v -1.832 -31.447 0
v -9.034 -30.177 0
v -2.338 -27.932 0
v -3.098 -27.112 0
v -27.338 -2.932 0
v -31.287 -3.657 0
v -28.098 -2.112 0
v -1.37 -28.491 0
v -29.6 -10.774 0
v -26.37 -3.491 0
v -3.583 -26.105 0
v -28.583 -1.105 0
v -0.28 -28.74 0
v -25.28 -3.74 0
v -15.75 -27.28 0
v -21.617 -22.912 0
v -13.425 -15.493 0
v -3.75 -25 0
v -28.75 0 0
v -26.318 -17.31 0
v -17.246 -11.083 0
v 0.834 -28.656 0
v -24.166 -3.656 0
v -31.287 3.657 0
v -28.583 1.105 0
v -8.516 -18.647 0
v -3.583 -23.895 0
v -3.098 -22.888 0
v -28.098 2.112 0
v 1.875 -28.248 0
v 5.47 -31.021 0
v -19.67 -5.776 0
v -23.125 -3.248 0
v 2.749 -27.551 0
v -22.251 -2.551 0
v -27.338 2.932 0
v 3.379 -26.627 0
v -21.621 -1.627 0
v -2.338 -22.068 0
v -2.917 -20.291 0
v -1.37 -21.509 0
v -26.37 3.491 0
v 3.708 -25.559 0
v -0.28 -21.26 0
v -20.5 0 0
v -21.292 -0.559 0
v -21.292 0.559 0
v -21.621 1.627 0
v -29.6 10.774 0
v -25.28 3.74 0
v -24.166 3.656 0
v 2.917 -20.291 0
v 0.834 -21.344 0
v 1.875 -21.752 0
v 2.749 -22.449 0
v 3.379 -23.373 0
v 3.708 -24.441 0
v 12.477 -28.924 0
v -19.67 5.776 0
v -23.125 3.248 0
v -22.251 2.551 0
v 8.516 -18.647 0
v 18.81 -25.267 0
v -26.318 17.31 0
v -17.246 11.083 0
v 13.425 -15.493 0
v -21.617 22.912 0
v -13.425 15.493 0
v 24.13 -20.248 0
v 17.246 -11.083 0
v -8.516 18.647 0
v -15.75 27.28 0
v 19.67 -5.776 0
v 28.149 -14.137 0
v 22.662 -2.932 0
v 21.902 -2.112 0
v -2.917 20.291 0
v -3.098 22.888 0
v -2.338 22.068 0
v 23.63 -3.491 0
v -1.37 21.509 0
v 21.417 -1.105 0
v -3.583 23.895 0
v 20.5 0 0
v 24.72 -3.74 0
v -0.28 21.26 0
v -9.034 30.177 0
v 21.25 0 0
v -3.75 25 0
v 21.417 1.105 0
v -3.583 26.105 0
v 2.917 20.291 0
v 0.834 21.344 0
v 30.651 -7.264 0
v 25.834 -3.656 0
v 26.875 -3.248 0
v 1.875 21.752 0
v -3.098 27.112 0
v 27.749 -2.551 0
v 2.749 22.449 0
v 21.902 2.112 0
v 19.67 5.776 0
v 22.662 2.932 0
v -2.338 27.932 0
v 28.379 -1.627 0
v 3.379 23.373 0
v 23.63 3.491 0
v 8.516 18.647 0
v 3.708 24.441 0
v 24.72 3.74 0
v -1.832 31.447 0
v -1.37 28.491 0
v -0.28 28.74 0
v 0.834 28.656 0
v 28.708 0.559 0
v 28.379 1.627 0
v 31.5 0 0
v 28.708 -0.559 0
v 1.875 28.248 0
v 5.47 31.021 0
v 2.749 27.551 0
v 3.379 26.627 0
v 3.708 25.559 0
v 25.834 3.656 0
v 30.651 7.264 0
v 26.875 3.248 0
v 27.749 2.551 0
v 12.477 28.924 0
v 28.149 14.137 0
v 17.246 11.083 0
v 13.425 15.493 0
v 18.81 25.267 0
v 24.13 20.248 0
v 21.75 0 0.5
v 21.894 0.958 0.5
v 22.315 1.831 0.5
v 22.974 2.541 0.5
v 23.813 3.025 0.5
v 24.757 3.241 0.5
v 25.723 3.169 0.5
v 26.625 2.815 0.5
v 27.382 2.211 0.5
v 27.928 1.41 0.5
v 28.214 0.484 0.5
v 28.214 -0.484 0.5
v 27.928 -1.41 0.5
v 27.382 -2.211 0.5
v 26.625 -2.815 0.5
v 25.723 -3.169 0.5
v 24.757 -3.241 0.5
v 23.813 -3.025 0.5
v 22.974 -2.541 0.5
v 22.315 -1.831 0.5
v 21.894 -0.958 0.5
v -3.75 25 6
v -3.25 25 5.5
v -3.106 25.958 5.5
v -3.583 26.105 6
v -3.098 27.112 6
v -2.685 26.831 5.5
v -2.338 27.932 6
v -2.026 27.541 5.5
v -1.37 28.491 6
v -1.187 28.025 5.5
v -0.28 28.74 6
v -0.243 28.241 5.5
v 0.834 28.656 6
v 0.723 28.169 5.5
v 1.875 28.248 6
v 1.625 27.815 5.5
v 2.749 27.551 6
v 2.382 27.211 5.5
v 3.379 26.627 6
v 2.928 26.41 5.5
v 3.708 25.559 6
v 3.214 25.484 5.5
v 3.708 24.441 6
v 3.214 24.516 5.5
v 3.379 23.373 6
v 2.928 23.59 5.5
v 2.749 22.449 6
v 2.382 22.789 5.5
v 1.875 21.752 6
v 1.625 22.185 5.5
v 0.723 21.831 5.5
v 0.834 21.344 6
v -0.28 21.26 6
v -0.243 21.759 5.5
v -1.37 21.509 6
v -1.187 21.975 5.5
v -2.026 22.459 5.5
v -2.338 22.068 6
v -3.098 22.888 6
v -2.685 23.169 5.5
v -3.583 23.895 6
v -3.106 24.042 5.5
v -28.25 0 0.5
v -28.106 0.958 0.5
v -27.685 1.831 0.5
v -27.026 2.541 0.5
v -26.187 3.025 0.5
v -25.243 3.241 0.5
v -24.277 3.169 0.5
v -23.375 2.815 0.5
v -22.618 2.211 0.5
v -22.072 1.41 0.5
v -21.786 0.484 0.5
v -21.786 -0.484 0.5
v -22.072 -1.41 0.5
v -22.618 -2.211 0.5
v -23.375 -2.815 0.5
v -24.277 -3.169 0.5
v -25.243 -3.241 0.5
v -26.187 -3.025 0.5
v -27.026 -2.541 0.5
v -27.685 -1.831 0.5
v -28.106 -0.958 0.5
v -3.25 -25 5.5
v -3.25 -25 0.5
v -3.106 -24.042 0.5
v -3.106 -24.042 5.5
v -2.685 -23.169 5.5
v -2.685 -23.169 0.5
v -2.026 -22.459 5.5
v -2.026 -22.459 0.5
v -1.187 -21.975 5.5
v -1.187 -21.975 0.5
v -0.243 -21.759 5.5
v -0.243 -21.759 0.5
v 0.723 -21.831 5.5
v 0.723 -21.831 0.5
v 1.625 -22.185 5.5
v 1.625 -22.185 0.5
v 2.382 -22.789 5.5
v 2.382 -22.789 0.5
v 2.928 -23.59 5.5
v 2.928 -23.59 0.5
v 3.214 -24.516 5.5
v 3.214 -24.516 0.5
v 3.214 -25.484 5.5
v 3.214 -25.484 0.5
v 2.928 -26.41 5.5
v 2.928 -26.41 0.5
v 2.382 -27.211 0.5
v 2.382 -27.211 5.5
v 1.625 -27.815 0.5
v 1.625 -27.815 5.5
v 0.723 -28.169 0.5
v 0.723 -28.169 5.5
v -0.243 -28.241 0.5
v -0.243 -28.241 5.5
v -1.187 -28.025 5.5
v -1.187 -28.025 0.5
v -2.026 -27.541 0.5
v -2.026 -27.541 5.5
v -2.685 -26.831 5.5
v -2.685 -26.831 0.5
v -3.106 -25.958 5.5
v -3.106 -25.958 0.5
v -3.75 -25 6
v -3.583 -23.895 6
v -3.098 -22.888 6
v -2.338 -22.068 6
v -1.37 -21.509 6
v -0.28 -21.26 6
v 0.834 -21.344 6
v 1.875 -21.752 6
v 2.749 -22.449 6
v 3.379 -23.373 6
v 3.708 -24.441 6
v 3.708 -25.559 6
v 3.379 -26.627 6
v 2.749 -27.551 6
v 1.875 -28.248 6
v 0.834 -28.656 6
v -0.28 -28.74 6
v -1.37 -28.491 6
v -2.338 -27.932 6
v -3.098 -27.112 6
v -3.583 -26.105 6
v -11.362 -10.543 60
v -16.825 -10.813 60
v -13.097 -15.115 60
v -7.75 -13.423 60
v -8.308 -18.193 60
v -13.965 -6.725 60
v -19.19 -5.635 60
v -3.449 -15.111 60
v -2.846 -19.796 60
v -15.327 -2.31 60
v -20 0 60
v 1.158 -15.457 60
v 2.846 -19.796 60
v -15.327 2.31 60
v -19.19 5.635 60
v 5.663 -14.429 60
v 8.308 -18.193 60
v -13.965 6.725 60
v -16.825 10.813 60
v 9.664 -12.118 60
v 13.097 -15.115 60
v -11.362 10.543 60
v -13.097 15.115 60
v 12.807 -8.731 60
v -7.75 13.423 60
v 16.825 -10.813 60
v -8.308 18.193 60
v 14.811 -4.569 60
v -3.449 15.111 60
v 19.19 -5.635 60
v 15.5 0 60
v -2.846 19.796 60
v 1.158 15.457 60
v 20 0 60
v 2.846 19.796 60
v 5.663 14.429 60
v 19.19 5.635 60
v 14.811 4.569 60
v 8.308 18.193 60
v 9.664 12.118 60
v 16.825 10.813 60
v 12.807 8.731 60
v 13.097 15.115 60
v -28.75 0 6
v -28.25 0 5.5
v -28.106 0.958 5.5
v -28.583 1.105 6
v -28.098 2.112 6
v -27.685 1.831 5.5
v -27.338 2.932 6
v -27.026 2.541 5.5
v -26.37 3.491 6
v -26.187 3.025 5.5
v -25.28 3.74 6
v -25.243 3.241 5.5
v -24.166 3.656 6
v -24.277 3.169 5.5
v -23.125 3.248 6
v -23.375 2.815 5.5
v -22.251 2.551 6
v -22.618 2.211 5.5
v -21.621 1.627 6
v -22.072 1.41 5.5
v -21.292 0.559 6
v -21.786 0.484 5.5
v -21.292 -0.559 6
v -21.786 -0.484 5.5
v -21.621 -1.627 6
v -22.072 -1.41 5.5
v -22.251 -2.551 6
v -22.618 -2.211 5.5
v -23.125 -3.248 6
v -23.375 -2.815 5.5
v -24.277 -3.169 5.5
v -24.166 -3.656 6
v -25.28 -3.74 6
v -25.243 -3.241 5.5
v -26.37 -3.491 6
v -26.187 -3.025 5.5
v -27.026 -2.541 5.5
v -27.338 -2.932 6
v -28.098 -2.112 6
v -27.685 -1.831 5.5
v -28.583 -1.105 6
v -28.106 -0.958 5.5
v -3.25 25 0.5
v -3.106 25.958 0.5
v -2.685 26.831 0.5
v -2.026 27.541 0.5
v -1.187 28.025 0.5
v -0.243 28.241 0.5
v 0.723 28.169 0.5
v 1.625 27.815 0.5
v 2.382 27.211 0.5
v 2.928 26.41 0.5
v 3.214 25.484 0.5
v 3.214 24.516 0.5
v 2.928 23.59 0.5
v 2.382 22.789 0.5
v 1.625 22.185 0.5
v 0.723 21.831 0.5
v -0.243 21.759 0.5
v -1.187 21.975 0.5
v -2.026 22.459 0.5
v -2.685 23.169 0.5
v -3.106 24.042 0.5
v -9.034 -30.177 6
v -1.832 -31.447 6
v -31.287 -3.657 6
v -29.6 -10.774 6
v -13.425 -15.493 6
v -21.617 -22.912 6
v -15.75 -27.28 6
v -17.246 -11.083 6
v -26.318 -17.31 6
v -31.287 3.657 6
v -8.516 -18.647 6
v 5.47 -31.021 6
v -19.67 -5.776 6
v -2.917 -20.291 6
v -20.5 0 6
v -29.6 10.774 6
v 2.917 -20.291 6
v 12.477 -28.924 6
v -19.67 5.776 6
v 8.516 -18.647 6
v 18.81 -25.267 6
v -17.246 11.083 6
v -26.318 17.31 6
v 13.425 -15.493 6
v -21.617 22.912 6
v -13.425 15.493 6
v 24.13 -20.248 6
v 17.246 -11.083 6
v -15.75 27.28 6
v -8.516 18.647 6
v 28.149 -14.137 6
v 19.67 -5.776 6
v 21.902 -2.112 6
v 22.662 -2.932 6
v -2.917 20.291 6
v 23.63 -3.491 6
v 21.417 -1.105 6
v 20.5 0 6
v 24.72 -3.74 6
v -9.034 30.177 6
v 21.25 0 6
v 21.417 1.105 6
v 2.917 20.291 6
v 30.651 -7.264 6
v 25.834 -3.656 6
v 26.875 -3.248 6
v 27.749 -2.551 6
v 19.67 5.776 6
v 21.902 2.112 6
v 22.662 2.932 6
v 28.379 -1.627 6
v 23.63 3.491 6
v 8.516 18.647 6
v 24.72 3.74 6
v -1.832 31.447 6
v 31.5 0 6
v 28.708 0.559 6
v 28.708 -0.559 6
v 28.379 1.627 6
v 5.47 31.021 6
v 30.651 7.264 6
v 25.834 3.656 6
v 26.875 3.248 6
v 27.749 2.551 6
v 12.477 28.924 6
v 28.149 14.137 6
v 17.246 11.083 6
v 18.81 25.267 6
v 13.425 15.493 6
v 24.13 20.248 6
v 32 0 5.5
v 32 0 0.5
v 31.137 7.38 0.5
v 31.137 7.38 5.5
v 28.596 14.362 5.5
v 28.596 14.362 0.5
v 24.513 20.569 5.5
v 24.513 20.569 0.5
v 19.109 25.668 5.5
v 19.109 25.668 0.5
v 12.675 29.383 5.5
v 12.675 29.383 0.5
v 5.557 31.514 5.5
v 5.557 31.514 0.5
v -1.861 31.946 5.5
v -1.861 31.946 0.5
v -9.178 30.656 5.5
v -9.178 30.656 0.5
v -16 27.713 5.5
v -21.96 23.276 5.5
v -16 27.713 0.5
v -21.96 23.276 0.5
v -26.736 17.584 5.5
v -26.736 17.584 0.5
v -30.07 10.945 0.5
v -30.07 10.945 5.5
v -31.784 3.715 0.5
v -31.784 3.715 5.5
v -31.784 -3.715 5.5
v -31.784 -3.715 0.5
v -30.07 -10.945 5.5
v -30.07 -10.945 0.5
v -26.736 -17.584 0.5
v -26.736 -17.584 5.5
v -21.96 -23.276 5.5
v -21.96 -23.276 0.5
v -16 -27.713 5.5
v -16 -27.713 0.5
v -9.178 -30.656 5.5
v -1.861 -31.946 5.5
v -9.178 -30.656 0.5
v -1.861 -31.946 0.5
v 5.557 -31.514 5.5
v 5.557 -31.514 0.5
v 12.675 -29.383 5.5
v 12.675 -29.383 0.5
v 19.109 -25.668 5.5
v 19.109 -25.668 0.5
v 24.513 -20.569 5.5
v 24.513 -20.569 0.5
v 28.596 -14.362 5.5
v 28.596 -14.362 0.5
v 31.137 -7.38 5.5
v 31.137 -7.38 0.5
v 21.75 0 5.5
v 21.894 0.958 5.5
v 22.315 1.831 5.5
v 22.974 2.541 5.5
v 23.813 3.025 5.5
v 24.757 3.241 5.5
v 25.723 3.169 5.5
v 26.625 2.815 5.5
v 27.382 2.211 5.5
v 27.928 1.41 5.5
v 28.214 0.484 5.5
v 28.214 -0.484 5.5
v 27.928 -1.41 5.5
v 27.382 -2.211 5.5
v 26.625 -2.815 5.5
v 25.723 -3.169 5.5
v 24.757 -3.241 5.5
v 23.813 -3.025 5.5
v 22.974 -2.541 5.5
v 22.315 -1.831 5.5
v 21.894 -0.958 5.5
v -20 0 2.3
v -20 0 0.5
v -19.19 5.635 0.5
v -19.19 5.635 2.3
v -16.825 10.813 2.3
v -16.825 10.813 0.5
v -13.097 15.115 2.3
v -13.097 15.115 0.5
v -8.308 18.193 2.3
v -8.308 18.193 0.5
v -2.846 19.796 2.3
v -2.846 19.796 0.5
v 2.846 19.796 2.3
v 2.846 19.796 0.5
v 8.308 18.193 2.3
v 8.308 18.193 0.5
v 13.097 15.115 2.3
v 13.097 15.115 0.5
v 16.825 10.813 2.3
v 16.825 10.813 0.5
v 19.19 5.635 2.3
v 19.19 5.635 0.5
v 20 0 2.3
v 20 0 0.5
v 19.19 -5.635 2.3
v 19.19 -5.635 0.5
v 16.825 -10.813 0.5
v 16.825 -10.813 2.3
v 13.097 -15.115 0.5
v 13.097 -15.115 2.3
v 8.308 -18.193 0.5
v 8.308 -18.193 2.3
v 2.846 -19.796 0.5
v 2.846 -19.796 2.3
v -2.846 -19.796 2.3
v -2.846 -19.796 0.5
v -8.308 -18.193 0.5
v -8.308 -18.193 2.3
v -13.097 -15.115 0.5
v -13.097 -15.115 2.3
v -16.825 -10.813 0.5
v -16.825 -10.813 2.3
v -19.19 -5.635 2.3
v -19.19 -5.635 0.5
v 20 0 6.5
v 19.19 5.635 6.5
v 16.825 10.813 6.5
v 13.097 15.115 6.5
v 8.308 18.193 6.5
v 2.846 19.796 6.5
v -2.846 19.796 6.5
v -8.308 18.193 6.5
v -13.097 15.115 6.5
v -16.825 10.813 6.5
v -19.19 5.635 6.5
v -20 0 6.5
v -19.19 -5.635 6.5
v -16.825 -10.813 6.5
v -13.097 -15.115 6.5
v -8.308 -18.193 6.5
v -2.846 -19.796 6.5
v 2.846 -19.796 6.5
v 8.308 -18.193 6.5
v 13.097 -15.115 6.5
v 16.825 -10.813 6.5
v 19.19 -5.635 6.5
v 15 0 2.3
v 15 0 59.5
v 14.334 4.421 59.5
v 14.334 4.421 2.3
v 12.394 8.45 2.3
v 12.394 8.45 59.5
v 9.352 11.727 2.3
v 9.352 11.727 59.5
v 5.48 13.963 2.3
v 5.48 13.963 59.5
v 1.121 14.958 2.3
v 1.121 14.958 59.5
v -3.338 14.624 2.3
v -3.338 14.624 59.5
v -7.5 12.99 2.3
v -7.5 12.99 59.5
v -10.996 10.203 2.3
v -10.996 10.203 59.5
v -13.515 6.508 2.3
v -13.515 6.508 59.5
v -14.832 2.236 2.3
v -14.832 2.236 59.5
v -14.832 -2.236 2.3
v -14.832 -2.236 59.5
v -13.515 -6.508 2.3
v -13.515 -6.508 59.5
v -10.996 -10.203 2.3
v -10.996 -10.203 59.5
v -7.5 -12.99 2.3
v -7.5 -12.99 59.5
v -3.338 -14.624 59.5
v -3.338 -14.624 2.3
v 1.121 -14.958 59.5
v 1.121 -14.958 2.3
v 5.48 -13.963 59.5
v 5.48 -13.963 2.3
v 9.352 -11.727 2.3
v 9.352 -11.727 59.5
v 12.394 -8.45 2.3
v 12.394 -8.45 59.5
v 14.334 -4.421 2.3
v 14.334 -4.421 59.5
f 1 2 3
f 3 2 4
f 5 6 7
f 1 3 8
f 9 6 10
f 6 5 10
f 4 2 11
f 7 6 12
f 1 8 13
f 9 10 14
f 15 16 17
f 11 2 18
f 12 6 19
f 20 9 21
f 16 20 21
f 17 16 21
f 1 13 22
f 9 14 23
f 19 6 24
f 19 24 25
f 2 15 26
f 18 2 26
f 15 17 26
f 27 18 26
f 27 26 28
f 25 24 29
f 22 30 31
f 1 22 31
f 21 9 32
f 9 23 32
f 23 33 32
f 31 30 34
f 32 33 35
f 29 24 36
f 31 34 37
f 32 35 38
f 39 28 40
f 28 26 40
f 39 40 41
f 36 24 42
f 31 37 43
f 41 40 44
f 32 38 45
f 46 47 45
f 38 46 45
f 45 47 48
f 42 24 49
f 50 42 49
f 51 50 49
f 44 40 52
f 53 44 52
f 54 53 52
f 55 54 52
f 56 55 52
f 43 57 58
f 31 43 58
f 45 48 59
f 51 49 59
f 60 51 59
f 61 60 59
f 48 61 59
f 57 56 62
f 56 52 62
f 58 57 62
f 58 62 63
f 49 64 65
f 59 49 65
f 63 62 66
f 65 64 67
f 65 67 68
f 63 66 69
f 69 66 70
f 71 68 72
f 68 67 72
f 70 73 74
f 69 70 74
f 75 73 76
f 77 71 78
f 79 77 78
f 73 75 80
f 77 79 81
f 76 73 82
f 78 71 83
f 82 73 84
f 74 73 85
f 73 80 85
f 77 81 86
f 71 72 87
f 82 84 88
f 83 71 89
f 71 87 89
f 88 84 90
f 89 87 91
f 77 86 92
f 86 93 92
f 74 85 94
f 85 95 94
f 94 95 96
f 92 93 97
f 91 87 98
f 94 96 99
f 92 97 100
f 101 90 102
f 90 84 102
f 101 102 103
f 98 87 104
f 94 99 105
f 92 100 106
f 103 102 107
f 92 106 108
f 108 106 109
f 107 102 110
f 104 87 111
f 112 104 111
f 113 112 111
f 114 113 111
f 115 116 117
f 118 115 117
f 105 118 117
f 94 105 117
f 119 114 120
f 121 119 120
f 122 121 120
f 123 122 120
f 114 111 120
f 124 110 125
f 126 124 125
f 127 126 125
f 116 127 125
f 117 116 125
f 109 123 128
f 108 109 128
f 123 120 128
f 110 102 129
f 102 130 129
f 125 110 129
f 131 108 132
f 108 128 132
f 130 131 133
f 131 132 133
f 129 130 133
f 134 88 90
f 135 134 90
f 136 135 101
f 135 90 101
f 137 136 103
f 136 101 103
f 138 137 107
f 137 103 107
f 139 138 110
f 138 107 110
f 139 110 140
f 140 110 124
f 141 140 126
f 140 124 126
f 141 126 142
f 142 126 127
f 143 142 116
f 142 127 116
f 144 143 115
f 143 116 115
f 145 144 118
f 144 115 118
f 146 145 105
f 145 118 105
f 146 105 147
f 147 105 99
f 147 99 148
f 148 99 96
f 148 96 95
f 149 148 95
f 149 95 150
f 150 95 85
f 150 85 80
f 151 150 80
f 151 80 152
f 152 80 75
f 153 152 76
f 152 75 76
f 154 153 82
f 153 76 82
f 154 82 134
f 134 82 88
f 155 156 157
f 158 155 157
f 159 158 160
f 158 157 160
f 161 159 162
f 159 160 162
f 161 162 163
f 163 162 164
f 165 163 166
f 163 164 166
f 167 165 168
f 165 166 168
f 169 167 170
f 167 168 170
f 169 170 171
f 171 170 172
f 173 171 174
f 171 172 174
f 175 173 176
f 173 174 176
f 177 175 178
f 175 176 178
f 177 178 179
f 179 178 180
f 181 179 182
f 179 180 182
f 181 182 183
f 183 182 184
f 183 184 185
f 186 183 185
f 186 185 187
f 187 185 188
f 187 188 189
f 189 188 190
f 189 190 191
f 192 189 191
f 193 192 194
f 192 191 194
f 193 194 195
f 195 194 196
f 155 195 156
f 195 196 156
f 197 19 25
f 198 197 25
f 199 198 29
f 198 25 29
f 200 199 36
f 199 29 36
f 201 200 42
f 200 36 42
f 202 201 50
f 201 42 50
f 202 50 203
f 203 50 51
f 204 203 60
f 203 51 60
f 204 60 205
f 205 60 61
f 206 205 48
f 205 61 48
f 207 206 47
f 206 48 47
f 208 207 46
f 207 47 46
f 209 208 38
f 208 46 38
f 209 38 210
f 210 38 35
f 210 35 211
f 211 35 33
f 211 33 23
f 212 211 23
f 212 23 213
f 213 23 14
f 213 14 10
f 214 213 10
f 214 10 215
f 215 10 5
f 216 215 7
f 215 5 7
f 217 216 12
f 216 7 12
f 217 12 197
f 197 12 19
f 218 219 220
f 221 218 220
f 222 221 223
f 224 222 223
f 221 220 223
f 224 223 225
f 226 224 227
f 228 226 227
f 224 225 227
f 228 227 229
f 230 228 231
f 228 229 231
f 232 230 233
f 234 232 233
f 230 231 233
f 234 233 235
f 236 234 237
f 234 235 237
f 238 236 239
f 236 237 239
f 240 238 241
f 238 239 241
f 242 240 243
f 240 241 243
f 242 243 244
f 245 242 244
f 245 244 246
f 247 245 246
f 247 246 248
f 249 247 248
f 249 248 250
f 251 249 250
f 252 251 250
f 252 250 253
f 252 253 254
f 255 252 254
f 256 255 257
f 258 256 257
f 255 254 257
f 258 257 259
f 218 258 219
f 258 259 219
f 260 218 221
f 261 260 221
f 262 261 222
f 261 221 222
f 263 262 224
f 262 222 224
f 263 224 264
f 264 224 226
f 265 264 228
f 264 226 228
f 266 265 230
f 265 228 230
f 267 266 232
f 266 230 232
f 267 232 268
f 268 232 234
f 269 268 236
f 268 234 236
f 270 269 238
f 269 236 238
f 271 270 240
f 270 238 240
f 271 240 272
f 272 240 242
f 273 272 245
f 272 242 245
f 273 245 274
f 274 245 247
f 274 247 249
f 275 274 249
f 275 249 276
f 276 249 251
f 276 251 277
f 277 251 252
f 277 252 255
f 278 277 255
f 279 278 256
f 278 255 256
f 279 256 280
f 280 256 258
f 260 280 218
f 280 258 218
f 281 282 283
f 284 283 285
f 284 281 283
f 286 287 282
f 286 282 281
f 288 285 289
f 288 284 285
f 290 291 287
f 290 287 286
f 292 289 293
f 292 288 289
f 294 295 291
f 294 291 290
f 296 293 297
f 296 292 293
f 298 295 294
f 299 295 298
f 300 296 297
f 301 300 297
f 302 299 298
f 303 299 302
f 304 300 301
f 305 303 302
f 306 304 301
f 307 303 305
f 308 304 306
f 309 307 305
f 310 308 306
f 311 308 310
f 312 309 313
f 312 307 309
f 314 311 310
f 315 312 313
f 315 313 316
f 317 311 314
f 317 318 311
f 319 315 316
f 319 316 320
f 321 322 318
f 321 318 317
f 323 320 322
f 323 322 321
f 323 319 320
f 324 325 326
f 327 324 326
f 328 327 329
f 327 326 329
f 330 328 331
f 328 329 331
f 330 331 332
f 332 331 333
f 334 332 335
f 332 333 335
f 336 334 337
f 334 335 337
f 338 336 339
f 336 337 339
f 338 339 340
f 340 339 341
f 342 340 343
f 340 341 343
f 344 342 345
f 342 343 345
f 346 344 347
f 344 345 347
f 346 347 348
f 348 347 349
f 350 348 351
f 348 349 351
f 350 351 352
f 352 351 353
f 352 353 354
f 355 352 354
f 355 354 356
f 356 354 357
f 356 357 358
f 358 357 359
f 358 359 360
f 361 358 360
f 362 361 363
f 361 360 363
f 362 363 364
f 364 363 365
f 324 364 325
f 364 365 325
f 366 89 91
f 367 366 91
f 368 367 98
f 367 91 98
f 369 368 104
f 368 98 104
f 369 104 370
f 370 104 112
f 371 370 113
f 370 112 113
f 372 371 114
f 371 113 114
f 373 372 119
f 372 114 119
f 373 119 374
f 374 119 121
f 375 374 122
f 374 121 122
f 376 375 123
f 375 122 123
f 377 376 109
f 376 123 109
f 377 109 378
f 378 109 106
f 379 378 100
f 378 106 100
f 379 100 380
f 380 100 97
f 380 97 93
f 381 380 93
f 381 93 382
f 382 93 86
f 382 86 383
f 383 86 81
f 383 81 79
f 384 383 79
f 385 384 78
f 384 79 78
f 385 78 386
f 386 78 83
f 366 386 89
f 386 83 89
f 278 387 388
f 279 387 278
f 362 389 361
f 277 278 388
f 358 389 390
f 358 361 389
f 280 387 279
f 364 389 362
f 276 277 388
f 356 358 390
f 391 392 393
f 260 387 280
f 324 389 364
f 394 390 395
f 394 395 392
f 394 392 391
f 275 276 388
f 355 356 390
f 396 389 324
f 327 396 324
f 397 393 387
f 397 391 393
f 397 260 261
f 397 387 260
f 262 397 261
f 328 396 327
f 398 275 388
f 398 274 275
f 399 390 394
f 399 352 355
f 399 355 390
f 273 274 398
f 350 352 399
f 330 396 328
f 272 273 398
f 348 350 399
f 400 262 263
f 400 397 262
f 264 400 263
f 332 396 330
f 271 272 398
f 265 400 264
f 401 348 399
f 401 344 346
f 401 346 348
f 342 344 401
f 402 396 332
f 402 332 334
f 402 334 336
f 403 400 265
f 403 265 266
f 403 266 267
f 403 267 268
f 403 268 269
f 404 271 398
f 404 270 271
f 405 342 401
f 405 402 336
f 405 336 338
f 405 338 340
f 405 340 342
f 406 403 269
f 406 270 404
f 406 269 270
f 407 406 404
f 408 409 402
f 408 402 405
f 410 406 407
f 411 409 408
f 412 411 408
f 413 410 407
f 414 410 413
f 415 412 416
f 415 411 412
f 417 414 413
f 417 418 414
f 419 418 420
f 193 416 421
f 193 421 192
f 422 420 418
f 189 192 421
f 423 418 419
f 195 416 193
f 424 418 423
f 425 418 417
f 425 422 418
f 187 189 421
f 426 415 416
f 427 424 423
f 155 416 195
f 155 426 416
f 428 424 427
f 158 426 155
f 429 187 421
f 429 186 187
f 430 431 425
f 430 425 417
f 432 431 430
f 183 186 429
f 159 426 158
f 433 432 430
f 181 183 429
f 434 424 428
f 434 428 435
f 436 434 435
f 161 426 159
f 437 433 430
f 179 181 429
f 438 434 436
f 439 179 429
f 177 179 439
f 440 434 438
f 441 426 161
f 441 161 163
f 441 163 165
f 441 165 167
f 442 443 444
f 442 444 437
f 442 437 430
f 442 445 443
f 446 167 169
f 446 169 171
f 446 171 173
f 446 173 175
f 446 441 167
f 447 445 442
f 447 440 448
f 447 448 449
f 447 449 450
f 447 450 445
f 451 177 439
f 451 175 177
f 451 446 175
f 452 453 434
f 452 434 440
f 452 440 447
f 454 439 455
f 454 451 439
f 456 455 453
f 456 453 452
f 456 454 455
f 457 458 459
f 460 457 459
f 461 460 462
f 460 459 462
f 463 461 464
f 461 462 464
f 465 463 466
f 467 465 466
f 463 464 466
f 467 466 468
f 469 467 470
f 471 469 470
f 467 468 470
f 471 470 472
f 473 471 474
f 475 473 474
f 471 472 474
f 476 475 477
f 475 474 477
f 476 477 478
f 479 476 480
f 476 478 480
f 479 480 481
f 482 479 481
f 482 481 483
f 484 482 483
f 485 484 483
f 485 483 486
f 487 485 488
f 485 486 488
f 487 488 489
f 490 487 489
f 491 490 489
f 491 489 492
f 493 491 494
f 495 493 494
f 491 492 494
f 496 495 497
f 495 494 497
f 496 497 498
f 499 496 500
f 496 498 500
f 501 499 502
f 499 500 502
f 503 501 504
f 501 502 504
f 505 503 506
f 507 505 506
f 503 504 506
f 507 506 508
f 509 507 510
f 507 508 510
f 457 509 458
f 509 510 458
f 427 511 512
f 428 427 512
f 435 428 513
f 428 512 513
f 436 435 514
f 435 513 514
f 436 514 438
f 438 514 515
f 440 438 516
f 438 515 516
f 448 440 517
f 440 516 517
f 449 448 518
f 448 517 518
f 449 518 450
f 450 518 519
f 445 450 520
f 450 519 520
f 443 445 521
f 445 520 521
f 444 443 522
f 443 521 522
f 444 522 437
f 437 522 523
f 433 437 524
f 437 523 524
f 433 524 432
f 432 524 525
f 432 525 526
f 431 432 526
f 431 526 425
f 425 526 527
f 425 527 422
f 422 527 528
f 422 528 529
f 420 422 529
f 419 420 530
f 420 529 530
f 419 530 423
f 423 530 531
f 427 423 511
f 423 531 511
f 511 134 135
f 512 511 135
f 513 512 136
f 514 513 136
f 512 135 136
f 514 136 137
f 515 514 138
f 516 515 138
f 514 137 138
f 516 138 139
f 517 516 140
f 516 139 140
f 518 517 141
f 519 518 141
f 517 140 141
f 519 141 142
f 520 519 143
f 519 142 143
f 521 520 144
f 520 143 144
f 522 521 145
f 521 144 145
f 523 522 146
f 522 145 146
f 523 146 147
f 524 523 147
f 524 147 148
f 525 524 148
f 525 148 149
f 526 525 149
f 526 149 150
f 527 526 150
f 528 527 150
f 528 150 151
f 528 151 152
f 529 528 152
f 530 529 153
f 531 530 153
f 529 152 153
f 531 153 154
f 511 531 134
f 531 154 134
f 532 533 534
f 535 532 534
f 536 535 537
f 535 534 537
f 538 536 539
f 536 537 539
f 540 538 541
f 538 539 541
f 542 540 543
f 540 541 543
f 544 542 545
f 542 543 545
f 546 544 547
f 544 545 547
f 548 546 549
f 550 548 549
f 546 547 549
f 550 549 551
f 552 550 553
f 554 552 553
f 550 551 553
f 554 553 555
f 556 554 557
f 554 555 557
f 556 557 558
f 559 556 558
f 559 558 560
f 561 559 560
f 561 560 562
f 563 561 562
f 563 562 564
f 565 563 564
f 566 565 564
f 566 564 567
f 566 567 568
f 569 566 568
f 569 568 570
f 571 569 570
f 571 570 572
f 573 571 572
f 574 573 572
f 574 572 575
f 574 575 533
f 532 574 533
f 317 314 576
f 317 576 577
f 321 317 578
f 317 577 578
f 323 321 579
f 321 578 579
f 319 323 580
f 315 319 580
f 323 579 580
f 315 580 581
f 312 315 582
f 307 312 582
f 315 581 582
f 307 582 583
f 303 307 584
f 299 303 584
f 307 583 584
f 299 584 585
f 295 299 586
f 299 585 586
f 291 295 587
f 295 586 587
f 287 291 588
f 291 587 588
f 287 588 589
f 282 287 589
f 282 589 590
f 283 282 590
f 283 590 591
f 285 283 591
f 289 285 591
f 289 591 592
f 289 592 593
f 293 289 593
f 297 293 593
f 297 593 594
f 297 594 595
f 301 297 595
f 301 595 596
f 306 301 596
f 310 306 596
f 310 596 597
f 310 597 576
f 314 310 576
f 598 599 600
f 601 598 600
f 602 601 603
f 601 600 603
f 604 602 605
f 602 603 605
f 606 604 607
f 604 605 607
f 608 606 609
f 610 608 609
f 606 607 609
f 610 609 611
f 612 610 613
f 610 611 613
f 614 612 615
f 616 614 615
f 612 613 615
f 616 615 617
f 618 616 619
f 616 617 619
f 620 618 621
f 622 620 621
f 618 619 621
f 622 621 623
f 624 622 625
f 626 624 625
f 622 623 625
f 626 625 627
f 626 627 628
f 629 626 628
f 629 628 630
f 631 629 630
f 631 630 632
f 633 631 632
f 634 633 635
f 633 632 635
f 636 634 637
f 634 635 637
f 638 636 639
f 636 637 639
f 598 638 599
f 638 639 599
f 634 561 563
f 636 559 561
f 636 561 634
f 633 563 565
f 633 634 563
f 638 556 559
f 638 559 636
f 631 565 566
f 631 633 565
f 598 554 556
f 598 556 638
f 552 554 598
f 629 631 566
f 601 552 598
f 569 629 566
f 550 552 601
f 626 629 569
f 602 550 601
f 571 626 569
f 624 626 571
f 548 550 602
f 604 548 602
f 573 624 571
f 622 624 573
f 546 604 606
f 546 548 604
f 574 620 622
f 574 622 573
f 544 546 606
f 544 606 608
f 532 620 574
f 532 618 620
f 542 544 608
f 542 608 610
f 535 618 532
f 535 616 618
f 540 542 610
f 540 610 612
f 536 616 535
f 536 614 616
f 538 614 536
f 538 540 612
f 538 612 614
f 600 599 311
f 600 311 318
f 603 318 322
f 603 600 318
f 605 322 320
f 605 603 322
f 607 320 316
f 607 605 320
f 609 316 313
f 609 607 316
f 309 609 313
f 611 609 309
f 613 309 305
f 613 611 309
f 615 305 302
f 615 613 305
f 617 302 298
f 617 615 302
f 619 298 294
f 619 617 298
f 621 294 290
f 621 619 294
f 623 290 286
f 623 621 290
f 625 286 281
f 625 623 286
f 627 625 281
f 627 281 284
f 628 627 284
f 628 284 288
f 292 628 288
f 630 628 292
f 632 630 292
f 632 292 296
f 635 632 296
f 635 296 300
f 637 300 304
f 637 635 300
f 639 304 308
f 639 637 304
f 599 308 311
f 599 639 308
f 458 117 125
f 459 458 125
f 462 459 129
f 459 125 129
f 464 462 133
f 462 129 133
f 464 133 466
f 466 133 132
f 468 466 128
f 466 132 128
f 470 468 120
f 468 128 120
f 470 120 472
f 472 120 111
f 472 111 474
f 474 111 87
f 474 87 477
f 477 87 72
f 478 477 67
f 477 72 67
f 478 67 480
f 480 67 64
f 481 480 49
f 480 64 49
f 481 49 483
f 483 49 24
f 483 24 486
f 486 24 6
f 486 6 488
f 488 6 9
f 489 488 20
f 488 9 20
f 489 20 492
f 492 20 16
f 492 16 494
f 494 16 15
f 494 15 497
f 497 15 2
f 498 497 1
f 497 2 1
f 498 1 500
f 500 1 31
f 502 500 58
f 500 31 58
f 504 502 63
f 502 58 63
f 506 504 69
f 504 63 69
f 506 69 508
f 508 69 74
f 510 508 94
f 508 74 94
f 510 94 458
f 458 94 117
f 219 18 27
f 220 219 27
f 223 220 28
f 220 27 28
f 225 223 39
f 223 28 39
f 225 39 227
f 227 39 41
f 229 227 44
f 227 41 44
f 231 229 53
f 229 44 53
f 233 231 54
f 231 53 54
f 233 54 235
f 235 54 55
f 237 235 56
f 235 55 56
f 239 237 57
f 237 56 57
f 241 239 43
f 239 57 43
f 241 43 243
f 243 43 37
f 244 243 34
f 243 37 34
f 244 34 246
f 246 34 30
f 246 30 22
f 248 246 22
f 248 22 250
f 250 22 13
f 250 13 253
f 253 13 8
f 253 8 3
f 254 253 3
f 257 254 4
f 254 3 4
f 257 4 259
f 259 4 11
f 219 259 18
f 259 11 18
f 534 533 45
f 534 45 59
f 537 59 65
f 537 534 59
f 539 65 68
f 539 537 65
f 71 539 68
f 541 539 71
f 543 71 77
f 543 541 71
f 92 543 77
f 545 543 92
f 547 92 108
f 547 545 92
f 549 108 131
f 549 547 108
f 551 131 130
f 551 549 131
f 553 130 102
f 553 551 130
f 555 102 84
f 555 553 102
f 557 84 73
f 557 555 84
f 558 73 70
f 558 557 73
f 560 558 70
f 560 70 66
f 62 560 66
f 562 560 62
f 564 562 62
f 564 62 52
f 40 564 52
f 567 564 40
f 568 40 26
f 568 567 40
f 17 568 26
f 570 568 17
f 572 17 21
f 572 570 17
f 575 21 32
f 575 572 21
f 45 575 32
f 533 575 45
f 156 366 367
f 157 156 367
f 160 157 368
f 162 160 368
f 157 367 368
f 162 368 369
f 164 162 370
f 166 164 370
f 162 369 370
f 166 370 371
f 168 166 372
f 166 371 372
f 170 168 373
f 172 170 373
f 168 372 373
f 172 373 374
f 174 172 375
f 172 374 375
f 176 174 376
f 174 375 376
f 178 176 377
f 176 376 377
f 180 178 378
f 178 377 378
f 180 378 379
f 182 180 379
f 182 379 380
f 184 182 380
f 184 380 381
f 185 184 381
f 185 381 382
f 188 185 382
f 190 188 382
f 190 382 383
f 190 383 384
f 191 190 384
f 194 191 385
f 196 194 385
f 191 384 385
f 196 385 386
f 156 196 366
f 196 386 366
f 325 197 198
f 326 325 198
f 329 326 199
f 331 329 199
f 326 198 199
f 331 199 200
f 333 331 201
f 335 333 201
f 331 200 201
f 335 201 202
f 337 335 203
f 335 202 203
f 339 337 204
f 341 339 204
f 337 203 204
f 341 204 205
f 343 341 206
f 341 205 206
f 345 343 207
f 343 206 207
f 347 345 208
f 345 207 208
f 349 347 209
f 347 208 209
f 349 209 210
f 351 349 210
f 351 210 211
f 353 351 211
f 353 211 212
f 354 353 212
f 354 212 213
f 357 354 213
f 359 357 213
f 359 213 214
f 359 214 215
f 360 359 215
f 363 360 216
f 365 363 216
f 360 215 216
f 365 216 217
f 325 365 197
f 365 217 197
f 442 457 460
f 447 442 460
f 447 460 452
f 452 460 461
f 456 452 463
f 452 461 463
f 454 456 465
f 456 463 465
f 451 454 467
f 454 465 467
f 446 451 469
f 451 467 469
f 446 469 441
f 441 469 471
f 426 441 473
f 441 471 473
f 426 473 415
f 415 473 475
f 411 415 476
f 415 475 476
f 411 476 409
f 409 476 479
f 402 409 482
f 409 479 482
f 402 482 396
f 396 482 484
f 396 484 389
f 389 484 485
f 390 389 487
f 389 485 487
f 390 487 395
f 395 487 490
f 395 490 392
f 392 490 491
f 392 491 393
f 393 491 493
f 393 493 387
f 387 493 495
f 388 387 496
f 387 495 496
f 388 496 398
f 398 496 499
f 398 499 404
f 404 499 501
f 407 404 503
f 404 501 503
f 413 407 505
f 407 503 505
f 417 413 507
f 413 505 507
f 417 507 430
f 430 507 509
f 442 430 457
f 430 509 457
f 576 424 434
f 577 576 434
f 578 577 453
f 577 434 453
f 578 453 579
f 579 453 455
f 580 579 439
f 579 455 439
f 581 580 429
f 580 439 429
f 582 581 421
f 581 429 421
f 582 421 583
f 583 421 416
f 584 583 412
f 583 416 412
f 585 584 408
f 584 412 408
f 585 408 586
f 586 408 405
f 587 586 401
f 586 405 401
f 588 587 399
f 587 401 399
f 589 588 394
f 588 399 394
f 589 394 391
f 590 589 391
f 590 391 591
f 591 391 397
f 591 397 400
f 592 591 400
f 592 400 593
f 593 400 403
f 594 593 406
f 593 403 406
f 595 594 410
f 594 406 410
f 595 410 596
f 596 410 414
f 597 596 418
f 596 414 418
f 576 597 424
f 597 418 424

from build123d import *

# Parameters (mm, degrees)
SKETCH1_R                               = 32
SKETCH1_R_2                             = 20
BOSS_EXTRUDE1_DEPTH                     = 6
SKETCH1_2_R                             = 20
BOSS_EXTRUDE2_DEPTH                     = 60
CBORE_FOR_M6_HEX_HEAD_BOLT1_D           = 30
CBORE_FOR_M6_HEX_HEAD_BOLT1_CBORE_D     = 40
CBORE_FOR_M6_HEX_HEAD_BOLT1_CBORE_DEPTH = 2.3
SKETCH7_R                               = 3.25
CUT_EXTRUDE1_DEPTH                      = 6
CHAMFER1_SIZE                           = 0.5


with BuildPart() as part:
    # Sketch1 → Boss-Extrude1 (new body)
    with BuildSketch(Plane.XY):
        Circle(SKETCH1_R)
        Circle(SKETCH1_R_2, mode=Mode.SUBTRACT)
    extrude(amount=BOSS_EXTRUDE1_DEPTH)

    # Sketch1<2> → Boss-Extrude2 (add)
    with BuildSketch(Plane.XY):
        Circle(SKETCH1_2_R)
    extrude(amount=BOSS_EXTRUDE2_DEPTH)

    # CBORE for M6 Hex Head Bolt1 (through all)
    with Locations(Plane(origin=(0, 0, 0), x_dir=(-1, 0, 0), z_dir=(0, 0, -1))):
        with Locations((0, 0)):
            CounterBoreHole(CBORE_FOR_M6_HEX_HEAD_BOLT1_D / 2, CBORE_FOR_M6_HEX_HEAD_BOLT1_CBORE_D / 2, CBORE_FOR_M6_HEX_HEAD_BOLT1_CBORE_DEPTH)

    # Sketch7 → Cut-Extrude1 (cut)
    with BuildSketch(Plane(origin=(0, 0, 0), x_dir=(-1, 0, 0), z_dir=(0, 0, -1))):
        with Locations((0, 25)):
            Circle(SKETCH7_R)
        with Locations((25, 0)):
            Circle(SKETCH7_R)
        with Locations((0, -25)):
            Circle(SKETCH7_R)
        with Locations((-25, 0)):
            Circle(SKETCH7_R)
    extrude(amount=-CUT_EXTRUDE1_DEPTH, mode=Mode.SUBTRACT)

    # Chamfer1
    chamfer1_edges = [part.edges().sort_by_distance(p)[0] for p in [
        (20, 0, 0),
        (-15, 0, 60),
        (-32, 0, 0),
        (3.25, 25, 6),
        (3.25, 25, 0),
        (-21.75, 0, 6),
        (-21.75, 0, 0),
        (3.25, -25, 6),
        (3.25, -25, 0),
        (28.25, 0, 6),
        (28.25, 0, 0),
        (-32, 0, 6),
        (-20, 0, 6),
    ]]
    chamfer(chamfer1_edges, length=CHAMFER1_SIZE)


solid = part.part
